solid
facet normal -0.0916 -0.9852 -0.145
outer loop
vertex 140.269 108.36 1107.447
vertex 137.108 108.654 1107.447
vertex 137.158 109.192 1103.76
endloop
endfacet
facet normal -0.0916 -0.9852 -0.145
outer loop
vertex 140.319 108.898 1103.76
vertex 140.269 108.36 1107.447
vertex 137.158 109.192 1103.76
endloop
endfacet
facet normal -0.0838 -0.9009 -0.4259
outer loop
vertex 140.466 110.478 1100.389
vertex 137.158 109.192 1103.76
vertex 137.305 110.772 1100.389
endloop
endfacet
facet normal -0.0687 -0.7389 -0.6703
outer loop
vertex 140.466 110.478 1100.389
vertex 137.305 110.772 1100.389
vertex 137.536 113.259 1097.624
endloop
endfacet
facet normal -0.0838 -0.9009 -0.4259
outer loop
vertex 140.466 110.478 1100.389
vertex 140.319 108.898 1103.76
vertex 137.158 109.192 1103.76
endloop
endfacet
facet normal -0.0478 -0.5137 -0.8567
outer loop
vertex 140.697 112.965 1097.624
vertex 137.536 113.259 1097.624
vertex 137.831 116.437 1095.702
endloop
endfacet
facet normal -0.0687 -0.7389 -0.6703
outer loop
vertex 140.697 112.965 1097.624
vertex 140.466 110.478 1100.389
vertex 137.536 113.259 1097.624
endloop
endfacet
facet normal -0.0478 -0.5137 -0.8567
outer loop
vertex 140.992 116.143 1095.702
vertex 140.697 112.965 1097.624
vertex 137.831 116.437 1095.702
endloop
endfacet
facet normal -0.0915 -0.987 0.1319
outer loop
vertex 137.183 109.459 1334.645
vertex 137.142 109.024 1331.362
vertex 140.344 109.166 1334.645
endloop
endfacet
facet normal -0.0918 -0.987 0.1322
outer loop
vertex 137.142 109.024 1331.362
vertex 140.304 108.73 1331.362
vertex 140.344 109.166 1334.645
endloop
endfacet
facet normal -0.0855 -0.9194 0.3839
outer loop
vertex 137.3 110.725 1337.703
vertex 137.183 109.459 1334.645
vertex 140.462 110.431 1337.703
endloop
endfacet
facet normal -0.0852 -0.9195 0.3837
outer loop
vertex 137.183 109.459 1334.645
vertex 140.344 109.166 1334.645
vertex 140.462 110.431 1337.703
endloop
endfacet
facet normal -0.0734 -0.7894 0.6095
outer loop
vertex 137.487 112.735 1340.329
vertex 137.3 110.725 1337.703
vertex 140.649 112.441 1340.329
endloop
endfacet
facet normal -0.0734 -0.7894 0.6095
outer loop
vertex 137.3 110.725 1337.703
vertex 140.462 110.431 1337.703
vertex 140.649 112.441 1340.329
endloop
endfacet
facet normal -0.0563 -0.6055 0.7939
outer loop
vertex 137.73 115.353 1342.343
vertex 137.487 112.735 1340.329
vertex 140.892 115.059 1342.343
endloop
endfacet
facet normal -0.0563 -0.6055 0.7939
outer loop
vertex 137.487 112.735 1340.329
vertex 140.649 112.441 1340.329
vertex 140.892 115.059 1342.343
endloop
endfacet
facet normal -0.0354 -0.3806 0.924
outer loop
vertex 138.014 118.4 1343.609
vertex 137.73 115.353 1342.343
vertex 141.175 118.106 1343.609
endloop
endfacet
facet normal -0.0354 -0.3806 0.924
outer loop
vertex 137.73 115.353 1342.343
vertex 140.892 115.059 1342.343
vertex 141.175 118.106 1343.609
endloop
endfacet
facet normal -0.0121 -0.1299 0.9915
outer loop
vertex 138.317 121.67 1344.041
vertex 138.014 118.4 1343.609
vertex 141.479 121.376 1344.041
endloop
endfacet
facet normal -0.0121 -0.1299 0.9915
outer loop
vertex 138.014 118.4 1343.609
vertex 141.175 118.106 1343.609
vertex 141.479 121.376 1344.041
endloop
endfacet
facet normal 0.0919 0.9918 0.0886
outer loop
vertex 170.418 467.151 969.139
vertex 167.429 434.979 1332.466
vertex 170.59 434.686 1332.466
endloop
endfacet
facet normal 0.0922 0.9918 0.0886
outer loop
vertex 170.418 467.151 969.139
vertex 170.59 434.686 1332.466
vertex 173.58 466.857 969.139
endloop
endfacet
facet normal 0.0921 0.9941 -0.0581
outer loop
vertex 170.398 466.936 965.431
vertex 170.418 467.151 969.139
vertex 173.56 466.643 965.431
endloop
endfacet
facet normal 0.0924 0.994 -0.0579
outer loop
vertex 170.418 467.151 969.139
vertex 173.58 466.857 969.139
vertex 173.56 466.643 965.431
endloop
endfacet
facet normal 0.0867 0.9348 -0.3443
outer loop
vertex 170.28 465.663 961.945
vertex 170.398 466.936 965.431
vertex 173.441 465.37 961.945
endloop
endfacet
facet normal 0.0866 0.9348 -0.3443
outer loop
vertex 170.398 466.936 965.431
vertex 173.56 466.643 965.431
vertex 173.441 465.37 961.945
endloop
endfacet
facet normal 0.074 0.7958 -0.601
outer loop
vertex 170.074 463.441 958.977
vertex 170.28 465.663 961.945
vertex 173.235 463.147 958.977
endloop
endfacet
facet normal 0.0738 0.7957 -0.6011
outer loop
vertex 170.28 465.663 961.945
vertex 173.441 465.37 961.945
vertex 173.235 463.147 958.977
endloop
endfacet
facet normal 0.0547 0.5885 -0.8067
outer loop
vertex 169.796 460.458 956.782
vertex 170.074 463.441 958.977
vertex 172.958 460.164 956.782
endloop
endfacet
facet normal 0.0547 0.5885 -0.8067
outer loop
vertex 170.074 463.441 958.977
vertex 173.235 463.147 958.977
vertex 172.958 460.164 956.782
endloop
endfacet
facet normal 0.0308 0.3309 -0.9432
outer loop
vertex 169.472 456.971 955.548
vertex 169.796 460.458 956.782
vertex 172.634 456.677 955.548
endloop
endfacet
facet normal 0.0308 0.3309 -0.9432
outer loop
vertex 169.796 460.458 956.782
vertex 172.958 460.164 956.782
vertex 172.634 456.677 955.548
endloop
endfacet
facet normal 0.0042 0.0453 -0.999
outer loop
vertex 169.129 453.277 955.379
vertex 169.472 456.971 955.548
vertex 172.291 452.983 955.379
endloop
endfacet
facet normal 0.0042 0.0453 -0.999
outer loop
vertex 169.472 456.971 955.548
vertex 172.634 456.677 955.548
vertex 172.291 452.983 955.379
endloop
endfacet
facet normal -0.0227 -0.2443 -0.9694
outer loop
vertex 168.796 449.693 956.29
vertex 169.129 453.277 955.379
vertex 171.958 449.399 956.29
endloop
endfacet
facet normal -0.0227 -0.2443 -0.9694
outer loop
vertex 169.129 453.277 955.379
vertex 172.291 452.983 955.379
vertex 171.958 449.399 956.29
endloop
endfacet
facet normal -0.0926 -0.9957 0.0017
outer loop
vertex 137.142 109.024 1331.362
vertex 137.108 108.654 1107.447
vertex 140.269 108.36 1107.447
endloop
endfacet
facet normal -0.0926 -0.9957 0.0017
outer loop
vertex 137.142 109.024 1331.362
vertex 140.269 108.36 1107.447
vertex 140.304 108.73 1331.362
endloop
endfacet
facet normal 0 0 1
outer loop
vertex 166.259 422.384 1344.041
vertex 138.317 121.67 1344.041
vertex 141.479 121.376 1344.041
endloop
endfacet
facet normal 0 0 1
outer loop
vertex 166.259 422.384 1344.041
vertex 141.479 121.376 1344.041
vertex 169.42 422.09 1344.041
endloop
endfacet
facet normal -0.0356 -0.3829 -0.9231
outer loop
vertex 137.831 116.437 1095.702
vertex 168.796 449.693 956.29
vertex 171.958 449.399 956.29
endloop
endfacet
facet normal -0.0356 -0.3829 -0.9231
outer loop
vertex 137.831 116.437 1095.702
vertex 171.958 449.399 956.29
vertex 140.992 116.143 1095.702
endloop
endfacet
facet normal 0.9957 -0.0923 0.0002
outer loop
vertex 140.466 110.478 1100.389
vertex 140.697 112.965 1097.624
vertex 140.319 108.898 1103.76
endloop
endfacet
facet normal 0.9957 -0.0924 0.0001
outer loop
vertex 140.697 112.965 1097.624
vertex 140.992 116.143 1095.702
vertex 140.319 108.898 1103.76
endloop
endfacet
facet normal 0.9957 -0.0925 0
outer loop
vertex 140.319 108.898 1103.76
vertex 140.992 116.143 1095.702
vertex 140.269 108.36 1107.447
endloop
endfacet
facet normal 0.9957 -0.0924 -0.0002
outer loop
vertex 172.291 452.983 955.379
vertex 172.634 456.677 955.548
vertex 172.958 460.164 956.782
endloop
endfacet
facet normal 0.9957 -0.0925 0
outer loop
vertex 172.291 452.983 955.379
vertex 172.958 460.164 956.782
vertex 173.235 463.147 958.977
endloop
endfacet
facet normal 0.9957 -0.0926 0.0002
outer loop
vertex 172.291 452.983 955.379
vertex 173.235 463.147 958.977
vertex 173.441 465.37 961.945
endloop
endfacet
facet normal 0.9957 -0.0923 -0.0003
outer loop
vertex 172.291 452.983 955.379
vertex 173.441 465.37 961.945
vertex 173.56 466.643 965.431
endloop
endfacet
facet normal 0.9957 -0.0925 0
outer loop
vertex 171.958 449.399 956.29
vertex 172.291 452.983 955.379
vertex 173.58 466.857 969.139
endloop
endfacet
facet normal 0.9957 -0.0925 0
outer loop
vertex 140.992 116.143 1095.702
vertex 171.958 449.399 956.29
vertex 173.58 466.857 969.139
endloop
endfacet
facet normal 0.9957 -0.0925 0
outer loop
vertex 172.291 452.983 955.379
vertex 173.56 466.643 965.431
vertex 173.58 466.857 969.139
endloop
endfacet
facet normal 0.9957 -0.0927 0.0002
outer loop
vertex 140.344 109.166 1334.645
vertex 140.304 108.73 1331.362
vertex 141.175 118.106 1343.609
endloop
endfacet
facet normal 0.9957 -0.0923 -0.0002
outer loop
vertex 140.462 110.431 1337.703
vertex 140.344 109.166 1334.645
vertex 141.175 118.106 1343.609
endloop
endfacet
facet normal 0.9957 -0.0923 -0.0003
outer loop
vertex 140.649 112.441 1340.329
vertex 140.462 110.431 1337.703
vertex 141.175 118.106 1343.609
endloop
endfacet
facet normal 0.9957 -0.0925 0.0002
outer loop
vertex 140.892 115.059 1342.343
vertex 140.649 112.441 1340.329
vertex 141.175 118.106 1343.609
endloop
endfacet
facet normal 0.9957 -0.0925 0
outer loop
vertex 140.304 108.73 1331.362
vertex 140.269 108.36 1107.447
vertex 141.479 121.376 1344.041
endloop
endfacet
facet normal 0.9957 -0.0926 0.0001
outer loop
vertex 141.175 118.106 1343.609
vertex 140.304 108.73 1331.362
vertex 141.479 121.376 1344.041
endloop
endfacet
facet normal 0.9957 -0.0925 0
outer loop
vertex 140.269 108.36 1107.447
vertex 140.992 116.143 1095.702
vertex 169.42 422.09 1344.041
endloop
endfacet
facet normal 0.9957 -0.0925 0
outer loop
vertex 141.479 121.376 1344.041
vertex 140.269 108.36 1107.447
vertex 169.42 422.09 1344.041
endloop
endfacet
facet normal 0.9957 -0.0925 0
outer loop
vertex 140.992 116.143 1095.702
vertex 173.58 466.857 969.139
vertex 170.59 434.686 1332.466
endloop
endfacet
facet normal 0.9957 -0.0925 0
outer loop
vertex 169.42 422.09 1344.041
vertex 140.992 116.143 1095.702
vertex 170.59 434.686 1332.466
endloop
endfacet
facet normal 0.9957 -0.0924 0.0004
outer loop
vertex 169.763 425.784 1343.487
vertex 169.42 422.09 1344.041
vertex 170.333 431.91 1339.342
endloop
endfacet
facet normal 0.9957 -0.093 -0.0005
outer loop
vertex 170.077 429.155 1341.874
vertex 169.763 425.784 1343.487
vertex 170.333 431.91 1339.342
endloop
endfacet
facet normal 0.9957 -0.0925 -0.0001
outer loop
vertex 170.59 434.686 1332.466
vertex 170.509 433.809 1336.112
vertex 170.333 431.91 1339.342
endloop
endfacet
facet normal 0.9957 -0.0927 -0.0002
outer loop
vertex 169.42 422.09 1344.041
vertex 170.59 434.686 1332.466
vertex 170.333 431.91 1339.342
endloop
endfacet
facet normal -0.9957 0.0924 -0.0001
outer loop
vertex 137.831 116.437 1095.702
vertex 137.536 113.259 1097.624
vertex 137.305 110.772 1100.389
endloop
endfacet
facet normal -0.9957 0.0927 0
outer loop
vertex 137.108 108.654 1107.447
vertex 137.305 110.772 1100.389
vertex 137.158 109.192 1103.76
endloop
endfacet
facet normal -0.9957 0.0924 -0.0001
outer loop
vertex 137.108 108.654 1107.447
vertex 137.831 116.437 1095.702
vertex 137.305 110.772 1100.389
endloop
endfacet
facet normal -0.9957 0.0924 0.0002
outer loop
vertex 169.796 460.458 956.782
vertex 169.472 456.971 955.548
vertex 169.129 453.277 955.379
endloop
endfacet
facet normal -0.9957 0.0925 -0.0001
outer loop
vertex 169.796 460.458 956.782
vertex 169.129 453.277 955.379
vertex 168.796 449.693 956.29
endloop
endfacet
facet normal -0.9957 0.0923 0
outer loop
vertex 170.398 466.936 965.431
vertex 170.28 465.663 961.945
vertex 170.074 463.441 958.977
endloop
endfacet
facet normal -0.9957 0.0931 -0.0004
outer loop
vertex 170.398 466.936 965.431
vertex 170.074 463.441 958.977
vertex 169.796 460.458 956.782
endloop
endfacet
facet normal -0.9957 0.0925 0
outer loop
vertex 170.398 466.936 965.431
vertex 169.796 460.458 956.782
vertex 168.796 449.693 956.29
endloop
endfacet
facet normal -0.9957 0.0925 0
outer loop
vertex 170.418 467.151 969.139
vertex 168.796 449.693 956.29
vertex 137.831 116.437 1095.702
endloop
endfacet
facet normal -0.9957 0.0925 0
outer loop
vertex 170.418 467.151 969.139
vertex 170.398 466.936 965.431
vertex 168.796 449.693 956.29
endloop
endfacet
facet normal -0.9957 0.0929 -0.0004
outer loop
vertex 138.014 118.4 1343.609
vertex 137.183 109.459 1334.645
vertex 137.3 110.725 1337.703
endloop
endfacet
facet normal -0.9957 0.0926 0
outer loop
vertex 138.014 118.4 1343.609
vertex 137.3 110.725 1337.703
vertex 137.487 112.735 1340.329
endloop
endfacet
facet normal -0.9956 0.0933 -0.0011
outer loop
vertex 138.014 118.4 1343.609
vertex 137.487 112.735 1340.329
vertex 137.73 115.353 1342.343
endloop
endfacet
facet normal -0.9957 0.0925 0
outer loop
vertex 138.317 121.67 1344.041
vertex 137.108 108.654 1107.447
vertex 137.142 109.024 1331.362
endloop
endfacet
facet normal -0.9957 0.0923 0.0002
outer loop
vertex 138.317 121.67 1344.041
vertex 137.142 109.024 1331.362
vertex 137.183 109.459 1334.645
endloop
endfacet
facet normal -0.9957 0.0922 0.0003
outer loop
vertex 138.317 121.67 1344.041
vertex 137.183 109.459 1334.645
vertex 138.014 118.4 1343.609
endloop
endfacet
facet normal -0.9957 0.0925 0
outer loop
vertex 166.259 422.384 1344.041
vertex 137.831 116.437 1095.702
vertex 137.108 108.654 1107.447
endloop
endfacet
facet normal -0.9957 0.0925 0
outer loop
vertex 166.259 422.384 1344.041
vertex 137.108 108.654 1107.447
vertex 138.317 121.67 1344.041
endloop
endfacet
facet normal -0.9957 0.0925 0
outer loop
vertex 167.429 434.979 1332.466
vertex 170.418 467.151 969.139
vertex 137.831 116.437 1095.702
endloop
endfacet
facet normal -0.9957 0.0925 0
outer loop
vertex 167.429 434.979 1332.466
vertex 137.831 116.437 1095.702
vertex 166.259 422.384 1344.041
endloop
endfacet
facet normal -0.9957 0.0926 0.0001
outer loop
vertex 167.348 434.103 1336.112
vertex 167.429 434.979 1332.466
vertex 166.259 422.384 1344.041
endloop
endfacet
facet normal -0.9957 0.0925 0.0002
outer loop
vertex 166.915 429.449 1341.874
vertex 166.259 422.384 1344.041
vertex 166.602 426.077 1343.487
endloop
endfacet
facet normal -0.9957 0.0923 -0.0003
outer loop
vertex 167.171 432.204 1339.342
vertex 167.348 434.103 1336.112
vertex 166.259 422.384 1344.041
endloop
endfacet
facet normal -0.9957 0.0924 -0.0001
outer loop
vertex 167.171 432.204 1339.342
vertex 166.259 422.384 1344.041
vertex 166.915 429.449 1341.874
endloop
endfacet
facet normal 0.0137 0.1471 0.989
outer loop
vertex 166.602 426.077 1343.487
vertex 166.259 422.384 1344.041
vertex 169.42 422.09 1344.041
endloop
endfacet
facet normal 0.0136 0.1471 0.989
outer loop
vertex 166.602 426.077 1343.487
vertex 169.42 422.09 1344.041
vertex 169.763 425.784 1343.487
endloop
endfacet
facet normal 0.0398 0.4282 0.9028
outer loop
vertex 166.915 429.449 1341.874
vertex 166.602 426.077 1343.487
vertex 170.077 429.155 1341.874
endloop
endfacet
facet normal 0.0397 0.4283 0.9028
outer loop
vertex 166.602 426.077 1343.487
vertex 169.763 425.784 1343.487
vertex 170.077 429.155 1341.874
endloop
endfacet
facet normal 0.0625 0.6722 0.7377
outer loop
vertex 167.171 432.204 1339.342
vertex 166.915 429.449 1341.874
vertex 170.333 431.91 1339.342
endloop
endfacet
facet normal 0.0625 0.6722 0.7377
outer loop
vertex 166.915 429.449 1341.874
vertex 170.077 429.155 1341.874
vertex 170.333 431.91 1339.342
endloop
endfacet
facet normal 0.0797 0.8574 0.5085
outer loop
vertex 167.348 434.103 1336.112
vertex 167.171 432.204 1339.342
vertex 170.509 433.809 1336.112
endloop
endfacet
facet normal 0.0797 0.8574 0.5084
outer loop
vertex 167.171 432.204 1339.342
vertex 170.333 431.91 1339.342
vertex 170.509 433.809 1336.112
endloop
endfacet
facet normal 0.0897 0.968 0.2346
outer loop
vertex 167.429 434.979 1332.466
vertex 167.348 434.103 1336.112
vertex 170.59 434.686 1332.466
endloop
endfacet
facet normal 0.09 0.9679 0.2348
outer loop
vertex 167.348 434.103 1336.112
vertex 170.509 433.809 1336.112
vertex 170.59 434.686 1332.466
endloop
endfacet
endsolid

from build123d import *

# Parameters (mm, degrees)
BOSS_EXTRUDE2_DEPTH = 3.175
FILLET1_R           = 12.7


with BuildPart() as part:
    # Sketch2 → Boss-Extrude2 (new body)
    with BuildSketch(Plane(origin=(125.924984682, -11.700540008, 0), x_dir=(0, 0, -1), z_dir=(0.9957109910599374, -0.0925182267579596, 0))):
        Polygon((-1098.963689663, 120.858697524), (-1344.041321718, 121.265601845), (-1344.041321718, 447.57468292), (-948.211534765, 482.774987334), align=None)
    extrude(amount=BOSS_EXTRUDE2_DEPTH)

    # Fillet1
    fillet1_edges = [part.edges().sort_by_distance(p)[0] for p in [
        (138.687308264, 108.492920797, 1098.963689663),
        (138.72495433, 108.898079901, 1344.041321718),
        (168.914491886, 433.807618411, 1344.041321718),
        (172.171161632, 468.856948404, 948.211534765),
    ]]
    fillet(fillet1_edges, radius=FILLET1_R)


solid = part.part
